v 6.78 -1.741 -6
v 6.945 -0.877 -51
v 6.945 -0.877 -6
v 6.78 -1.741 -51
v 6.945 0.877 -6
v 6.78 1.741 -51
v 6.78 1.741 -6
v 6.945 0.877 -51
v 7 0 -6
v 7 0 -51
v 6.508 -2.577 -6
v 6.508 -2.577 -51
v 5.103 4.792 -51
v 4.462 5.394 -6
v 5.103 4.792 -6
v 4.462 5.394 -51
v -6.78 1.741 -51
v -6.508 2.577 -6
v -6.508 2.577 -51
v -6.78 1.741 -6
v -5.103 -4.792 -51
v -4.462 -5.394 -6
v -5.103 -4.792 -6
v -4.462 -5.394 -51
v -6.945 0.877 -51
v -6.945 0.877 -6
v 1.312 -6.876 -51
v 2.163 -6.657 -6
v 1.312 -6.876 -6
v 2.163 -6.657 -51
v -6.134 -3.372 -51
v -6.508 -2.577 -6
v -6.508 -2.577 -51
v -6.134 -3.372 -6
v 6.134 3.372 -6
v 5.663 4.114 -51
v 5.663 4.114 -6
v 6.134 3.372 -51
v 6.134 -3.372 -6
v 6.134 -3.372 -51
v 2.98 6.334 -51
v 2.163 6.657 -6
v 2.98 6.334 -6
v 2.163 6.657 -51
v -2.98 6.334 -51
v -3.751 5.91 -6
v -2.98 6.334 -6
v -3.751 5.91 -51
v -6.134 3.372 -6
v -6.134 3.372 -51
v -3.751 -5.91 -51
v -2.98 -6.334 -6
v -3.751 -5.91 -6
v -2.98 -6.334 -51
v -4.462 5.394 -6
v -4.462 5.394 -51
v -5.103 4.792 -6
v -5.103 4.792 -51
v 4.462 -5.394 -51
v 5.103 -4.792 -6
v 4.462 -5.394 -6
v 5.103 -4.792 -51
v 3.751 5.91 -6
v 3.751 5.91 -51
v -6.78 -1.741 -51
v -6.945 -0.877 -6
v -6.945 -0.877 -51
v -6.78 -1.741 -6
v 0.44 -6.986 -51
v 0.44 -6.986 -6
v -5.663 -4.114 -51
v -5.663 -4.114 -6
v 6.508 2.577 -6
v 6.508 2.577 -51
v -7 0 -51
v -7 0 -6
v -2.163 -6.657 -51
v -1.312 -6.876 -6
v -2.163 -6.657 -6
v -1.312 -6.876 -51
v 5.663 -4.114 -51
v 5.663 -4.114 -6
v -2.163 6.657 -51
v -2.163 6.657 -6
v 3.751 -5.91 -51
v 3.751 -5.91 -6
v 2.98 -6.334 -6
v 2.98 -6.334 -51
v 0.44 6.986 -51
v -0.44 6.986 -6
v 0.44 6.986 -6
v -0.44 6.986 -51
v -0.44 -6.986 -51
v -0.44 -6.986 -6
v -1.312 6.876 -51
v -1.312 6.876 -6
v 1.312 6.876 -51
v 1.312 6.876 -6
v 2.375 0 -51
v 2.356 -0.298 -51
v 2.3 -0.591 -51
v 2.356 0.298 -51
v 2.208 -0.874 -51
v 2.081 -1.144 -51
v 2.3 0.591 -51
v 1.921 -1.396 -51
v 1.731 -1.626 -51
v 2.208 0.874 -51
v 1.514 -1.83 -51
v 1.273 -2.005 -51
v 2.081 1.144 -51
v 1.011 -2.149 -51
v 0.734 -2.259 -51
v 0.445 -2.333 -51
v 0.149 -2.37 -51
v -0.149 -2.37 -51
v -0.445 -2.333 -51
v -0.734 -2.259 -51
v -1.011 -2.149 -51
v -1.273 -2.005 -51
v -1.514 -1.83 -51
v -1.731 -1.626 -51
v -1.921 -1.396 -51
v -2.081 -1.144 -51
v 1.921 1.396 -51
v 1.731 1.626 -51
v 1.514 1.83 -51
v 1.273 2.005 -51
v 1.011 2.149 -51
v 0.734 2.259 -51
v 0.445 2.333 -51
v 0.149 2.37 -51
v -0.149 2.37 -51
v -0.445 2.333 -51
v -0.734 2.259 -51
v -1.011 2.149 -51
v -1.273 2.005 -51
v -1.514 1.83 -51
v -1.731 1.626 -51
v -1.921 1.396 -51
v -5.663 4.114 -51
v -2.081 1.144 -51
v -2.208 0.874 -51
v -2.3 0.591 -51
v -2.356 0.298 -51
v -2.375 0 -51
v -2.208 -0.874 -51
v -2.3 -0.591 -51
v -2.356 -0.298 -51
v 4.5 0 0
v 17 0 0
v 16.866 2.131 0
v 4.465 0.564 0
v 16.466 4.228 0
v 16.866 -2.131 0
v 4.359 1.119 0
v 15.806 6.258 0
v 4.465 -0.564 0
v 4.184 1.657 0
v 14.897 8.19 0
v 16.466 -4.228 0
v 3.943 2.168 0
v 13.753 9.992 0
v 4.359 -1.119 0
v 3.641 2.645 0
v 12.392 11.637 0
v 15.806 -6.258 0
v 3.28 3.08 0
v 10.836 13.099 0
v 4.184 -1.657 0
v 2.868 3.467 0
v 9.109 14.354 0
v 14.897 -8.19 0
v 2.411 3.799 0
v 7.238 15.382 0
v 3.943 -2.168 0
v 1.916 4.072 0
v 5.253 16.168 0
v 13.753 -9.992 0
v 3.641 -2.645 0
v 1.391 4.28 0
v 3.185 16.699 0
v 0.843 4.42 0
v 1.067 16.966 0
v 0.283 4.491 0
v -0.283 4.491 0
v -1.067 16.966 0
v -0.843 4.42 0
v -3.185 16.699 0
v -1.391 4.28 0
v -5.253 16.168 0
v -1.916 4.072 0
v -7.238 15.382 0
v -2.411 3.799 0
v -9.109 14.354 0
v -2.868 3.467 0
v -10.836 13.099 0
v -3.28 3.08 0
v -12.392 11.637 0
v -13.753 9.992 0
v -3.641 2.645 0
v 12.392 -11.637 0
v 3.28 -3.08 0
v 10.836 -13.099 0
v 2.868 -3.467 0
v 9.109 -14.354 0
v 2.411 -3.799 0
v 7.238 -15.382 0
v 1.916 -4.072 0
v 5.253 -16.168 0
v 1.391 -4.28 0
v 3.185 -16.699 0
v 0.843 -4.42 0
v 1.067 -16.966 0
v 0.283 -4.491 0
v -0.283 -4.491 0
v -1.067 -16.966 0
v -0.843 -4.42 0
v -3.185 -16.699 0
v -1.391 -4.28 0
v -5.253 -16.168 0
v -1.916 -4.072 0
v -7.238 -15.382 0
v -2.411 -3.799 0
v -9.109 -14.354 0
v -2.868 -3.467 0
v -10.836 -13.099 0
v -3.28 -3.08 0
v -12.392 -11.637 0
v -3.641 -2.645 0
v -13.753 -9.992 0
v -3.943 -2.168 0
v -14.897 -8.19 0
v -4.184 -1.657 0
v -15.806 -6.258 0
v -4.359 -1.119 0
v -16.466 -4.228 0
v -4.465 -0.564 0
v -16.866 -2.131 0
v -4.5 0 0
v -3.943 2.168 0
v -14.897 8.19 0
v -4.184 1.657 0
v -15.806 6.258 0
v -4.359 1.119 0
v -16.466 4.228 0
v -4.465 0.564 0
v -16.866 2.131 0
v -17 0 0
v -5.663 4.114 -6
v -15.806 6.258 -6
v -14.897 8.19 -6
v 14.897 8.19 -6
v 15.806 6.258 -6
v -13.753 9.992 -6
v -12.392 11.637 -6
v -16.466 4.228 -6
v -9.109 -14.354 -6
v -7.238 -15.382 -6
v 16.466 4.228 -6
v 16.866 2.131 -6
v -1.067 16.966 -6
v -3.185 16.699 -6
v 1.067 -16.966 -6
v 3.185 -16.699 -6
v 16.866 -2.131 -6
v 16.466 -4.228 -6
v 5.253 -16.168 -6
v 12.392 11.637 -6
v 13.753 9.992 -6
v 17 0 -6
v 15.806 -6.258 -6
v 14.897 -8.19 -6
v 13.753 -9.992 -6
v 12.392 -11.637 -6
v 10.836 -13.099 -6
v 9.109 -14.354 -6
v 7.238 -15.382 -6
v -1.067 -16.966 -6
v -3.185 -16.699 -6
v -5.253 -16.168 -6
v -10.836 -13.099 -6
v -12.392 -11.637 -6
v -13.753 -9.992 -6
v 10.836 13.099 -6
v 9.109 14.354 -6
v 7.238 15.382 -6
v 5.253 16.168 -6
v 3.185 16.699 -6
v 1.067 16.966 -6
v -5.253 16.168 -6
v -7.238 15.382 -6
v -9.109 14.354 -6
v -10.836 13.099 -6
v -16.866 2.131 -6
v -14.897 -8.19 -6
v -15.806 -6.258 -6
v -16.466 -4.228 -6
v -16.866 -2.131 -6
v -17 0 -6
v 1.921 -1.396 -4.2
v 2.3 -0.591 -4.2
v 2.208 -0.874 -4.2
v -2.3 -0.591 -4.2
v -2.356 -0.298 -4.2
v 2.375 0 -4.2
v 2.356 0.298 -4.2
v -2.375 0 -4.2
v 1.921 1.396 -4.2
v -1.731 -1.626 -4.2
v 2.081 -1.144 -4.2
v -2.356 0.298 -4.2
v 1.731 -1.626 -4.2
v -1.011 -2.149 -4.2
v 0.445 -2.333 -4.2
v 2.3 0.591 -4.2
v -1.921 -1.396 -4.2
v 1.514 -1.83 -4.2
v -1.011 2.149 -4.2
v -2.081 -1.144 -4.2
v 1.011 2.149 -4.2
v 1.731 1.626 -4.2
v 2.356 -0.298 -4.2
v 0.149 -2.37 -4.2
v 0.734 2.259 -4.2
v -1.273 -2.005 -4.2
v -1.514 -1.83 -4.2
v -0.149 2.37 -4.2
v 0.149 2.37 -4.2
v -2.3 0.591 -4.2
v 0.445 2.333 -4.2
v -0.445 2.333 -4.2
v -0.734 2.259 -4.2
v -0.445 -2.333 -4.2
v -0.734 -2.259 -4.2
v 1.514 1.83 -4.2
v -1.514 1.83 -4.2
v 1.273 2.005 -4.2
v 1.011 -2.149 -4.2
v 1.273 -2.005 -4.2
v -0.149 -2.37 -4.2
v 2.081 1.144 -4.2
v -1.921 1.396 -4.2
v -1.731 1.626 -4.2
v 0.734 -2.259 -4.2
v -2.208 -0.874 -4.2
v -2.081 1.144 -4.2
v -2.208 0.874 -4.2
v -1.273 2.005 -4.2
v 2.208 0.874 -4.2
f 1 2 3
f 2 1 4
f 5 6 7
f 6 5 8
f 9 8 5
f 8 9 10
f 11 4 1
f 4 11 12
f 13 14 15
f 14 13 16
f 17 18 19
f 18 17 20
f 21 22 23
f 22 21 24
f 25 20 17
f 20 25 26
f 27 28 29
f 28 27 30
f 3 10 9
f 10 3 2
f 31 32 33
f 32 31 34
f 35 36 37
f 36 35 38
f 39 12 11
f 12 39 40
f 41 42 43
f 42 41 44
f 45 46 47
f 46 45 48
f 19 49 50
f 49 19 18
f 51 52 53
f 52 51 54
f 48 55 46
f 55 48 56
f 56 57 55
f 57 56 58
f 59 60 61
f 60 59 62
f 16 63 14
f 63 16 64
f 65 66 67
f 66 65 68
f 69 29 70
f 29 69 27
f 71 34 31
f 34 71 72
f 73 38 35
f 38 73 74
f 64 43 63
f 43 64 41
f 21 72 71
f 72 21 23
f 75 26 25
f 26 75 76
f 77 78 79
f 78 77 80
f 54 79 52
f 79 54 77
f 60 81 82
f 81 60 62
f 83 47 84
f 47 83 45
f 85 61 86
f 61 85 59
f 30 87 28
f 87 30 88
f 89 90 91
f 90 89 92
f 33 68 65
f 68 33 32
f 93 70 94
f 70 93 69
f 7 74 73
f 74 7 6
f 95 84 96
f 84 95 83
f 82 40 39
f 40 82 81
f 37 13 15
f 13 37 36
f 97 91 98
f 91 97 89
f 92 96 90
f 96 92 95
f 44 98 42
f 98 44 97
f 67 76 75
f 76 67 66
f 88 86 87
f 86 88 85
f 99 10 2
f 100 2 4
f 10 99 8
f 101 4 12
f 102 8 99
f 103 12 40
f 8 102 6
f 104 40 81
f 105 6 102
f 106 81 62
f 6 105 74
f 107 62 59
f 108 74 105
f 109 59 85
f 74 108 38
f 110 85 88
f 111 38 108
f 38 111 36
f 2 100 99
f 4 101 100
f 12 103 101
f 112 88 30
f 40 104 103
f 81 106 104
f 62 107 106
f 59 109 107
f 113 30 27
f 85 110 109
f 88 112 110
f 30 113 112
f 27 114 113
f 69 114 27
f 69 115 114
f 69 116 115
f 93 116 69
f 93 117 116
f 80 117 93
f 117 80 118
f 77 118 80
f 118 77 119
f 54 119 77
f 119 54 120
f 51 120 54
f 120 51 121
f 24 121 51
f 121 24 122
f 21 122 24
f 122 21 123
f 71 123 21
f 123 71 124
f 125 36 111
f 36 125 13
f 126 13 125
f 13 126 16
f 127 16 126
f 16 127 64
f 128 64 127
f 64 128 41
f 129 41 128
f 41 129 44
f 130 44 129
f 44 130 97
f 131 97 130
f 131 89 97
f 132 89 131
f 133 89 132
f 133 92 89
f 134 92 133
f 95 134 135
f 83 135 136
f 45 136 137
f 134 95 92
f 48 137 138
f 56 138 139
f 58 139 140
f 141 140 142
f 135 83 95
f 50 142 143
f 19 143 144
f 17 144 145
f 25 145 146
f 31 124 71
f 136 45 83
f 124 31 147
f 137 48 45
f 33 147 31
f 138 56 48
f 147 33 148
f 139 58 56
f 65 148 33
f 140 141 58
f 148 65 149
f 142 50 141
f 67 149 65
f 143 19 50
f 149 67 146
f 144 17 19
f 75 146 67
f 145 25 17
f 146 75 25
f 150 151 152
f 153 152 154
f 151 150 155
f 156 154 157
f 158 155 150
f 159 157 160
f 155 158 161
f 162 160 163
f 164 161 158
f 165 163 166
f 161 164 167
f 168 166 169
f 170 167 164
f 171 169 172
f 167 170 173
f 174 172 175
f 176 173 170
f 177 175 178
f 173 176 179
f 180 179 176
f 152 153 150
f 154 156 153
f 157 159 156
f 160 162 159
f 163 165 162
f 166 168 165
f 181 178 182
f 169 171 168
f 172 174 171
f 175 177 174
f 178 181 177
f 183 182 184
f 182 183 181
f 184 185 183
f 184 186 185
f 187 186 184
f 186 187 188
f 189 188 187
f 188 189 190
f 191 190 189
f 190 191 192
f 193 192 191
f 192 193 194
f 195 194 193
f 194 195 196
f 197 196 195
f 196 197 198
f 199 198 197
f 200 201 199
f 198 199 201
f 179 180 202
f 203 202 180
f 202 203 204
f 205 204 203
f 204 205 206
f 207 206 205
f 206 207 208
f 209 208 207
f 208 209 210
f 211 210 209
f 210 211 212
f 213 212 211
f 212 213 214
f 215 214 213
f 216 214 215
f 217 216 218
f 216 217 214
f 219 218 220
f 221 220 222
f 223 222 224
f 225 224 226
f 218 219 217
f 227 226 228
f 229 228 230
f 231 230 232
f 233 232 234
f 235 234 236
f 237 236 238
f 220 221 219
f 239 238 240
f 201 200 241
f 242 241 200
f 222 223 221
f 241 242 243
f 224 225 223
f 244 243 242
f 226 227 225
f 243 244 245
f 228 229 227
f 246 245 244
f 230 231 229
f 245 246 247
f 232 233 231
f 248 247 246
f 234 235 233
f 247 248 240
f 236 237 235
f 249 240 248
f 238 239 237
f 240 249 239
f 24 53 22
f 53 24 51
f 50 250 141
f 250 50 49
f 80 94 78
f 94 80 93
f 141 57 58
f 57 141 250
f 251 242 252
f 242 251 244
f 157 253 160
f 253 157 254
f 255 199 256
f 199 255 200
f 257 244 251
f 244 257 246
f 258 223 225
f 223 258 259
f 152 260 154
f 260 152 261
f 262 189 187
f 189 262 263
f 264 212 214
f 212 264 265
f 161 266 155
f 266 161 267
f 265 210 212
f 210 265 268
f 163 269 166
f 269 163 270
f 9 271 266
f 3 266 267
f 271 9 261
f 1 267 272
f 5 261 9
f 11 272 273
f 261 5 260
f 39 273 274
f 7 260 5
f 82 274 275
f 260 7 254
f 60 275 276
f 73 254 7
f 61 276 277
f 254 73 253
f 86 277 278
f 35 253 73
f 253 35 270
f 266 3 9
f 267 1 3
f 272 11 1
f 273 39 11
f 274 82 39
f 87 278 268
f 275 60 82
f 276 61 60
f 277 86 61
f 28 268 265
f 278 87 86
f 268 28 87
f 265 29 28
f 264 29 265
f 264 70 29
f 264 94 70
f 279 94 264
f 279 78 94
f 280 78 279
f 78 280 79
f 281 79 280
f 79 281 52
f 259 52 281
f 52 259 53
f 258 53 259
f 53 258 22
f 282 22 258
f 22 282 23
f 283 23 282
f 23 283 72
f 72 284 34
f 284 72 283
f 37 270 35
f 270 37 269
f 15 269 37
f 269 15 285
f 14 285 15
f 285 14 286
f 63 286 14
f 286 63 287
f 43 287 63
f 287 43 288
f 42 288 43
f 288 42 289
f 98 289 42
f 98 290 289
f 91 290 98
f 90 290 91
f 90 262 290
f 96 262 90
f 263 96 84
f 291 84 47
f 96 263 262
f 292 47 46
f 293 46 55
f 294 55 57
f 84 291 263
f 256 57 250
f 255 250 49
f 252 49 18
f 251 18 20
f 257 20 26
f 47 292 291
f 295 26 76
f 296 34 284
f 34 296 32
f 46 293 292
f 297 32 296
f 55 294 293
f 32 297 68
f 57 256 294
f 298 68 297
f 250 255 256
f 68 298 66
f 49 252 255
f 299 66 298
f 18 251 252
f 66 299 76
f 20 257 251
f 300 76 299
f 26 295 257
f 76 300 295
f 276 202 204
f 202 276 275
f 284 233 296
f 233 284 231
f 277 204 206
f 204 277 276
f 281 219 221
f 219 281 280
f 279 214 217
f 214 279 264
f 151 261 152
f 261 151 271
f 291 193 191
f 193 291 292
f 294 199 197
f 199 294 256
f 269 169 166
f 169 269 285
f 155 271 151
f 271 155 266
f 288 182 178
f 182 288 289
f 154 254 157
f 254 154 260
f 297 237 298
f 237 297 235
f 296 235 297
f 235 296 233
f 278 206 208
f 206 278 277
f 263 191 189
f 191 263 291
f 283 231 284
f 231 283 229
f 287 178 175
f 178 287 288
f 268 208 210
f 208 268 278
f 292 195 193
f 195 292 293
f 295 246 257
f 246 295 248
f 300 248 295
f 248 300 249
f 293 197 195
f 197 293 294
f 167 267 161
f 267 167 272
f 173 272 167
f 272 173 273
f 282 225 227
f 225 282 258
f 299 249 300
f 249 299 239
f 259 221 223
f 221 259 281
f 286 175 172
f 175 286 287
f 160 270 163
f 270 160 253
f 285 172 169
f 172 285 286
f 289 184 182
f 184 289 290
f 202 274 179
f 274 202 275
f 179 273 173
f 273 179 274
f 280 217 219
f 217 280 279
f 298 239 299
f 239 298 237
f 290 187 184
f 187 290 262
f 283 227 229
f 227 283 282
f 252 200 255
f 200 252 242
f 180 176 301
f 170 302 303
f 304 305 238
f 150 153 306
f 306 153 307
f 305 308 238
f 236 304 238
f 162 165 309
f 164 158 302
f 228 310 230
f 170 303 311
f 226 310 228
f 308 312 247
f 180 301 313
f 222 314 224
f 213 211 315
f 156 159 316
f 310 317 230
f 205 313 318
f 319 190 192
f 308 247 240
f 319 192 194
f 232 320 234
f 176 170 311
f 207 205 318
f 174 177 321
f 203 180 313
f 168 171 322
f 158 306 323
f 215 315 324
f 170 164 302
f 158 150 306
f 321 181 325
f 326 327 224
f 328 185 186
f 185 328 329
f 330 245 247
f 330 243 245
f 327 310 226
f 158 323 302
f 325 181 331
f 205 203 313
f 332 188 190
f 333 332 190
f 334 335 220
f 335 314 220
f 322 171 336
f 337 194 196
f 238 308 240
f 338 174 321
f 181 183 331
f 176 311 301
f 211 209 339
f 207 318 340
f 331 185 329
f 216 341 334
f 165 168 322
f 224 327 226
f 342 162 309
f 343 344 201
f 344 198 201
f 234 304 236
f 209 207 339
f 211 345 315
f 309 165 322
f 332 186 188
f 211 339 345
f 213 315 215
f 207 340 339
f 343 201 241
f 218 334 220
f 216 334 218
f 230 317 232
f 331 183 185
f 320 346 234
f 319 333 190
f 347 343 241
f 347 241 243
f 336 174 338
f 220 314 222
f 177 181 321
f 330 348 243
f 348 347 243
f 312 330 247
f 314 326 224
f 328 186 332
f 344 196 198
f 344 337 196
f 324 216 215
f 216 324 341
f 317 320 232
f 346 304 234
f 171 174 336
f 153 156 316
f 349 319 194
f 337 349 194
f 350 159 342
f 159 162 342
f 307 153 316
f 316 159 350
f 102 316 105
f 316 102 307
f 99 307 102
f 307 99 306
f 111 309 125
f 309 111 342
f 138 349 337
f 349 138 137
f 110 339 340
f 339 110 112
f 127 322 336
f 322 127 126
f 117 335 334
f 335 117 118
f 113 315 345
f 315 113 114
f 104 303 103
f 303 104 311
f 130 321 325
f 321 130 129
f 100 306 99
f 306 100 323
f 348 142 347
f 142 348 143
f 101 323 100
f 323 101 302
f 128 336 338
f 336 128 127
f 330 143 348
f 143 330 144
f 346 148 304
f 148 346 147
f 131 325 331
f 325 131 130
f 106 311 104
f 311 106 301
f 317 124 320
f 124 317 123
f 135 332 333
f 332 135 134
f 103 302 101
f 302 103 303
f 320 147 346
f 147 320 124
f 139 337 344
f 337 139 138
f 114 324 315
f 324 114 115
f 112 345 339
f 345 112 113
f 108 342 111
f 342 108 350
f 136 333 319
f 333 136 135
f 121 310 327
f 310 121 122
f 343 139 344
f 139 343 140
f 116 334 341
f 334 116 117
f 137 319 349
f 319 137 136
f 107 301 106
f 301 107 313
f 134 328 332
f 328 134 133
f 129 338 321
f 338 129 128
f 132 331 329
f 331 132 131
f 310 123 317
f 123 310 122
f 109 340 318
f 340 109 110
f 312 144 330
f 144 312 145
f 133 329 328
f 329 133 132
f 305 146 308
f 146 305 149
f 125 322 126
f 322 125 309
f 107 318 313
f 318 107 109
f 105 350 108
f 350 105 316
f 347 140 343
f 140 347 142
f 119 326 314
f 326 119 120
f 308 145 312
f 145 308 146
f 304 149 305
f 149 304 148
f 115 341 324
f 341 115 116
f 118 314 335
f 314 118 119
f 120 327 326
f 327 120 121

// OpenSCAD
$fn = 50;


difference() {
	union() {
		translate(v = [0, 0, -51.0000000000]) {
			cylinder(h = 51, r = 7.0000000000);
		}
		translate(v = [0, 0, -6.0000000000]) {
			cylinder(h = 6, r = 17.0000000000);
		}
	}
	union() {
		translate(v = [0, 0, 0]) {
			rotate(a = [0, 0, 0]) {
				difference() {
					union() {
						#translate(v = [0, 0, -51.0000000000]) {
							cylinder(h = 51, r = 2.2500000000);
						}
						#translate(v = [0, 0, -4.2000000000]) {
							cylinder(h = 4.2000000000, r = 7.0000000000, r1 = 2.3750000000, r2 = 4.5000000000);
						}
						#translate(v = [0, 0, -51.0000000000]) {
							cylinder(h = 51, r = 2.3750000000);
						}
						#translate(v = [0, 0, -51.0000000000]) {
							cylinder(h = 51, r = 2.2500000000);
						}
					}
					union();
				}
			}
		}
	}
}
